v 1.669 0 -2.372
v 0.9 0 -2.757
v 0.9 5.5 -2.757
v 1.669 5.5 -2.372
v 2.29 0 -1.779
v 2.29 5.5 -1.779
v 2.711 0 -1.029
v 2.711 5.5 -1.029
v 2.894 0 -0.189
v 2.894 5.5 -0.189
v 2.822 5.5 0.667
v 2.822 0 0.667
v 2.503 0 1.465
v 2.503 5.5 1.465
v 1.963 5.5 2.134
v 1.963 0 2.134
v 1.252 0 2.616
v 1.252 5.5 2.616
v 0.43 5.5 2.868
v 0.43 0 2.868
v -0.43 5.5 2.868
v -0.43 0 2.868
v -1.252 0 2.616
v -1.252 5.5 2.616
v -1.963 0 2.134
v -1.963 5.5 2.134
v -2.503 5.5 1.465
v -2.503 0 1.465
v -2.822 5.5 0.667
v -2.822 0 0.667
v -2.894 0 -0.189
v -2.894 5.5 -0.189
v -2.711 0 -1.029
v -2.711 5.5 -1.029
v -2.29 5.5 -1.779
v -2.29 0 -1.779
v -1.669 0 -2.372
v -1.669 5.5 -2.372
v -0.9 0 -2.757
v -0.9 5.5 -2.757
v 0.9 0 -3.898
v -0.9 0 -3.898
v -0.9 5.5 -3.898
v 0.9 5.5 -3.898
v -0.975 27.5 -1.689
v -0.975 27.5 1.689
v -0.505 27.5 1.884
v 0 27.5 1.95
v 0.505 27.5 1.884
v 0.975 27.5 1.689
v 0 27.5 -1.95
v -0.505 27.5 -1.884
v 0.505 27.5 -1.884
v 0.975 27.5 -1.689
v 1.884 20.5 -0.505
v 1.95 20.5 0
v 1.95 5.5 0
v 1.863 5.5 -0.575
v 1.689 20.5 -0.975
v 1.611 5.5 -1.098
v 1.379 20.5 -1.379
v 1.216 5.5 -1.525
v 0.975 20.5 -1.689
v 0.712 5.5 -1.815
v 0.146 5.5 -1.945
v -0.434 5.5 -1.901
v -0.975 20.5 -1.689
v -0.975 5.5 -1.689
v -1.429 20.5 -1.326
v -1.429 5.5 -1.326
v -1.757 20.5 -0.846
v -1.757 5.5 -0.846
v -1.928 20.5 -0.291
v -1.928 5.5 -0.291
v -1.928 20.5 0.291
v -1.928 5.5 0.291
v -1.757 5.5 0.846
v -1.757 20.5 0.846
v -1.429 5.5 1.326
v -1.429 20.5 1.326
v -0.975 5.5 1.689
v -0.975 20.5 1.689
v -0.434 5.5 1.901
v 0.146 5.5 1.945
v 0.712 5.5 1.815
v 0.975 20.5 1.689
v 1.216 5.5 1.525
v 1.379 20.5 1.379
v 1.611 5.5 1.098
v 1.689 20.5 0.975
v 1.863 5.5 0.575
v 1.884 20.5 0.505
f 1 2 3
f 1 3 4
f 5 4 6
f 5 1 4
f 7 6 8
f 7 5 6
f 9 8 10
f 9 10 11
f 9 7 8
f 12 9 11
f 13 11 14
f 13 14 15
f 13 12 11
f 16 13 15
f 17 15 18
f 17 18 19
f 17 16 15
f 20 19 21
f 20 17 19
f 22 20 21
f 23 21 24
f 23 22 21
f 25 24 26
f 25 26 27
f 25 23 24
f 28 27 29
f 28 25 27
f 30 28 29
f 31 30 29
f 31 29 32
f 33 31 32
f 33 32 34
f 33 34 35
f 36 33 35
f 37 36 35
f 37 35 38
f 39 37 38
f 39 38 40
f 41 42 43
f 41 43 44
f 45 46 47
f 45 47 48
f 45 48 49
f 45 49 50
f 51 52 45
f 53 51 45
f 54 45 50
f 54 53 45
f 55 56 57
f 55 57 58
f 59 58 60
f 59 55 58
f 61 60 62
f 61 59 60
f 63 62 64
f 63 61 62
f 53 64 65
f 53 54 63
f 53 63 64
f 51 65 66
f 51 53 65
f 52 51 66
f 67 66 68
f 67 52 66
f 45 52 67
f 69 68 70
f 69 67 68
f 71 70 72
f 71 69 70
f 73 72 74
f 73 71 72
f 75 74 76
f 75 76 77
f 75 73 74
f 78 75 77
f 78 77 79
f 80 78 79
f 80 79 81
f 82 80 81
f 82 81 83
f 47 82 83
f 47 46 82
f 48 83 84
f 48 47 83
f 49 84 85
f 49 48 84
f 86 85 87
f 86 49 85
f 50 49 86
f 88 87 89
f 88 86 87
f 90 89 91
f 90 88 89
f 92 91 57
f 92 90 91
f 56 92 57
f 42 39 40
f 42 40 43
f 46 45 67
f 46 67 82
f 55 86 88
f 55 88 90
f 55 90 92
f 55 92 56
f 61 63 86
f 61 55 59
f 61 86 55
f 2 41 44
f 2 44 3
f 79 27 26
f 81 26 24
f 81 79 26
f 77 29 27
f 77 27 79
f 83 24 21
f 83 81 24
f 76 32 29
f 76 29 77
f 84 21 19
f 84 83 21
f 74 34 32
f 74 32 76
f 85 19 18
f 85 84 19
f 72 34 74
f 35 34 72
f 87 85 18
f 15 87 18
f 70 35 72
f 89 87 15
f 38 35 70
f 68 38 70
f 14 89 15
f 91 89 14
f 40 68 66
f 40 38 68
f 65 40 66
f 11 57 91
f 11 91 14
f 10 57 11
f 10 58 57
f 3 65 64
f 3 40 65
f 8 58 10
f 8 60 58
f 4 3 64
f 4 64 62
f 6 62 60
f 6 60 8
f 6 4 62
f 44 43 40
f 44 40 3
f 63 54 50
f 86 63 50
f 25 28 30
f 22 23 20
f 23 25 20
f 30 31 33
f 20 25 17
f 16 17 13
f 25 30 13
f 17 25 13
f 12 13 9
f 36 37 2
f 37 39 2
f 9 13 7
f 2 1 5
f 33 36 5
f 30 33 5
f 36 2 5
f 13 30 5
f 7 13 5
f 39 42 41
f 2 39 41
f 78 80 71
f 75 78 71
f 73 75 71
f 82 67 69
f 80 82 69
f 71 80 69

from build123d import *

# Parameters (mm, degrees)
SKETCH1_R           = 3
SKETCH1_W           = 2
SKETCH1_H           = 1.17
BOSS_EXTRUDE1_DEPTH = 27.5
SKETCH2_R           = 6.166150273
SKETCH2_R_2         = 1.95
CUT_EXTRUDE1_DEPTH  = 22
CUT_EXTRUDE2_DEPTH  = 7
CUT_EXTRUDE3_DEPTH  = 100


with BuildPart() as part:
    # Sketch1 → Boss-Extrude1 (new body)
    with BuildSketch(Plane(origin=(0, 0, 0), x_dir=(1, 0, 0), z_dir=(0, 1, 0))):
        Circle(SKETCH1_R)
        with Locations((0, 3.413427125)):
            Rectangle(SKETCH1_W, SKETCH1_H)
    extrude(amount=BOSS_EXTRUDE1_DEPTH)

    # Sketch2 → Cut-Extrude1 (cut)
    with BuildSketch(Plane(origin=(0, 27.5, 0), x_dir=(1, 0, 0), z_dir=(0, 1, 0))):
        Circle(SKETCH2_R)
        Circle(SKETCH2_R_2, mode=Mode.SUBTRACT)
    extrude(amount=-CUT_EXTRUDE1_DEPTH, mode=Mode.SUBTRACT)

    # Sketch3 → Cut-Extrude2 (cut)
    with BuildSketch(Plane(origin=(0, 27.5, 0), x_dir=(1, 0, 0), z_dir=(0, 1, 0))):
        with BuildLine():
            Line((-0.975, 1.688749537), (-0.975, -1.688749537))
            ThreePointArc((-0.975, -1.688749537), (-1.95, 0), (-0.975, 1.688749537))
        make_face()
        with BuildLine():
            Line((0.975, 1.688749537), (0.975, -1.688749537))
            ThreePointArc((0.975, -1.688749537), (1.95, 0), (0.975, 1.688749537))
        make_face()
    extrude(amount=-CUT_EXTRUDE2_DEPTH, mode=Mode.SUBTRACT)

    # Sketch4 → Cut-Extrude3 (cut)
    with BuildSketch(Plane.XZ):
        with BuildLine():
            Line((-1, -3.998427125), (1, -3.998427125))
            Line((1, -3.998427125), (1, -2.828427125))
            ThreePointArc((1, -2.828427125), (0, 3), (-1, -2.828427125))
            Line((-1, -2.828427125), (-1, -3.998427125))
        make_face()
        with BuildLine():
            Line((-0.9, -2.75680975), (-0.9, -3.898427125))
            Line((-0.9, -3.898427125), (0.9, -3.898427125))
            Line((0.9, -3.898427125), (0.9, -2.75680975))
            ThreePointArc((0.9, -2.75680975), (0, 2.9), (-0.9, -2.75680975))
        make_face(mode=Mode.SUBTRACT)
    extrude(amount=-CUT_EXTRUDE3_DEPTH, mode=Mode.SUBTRACT)


solid = part.part
